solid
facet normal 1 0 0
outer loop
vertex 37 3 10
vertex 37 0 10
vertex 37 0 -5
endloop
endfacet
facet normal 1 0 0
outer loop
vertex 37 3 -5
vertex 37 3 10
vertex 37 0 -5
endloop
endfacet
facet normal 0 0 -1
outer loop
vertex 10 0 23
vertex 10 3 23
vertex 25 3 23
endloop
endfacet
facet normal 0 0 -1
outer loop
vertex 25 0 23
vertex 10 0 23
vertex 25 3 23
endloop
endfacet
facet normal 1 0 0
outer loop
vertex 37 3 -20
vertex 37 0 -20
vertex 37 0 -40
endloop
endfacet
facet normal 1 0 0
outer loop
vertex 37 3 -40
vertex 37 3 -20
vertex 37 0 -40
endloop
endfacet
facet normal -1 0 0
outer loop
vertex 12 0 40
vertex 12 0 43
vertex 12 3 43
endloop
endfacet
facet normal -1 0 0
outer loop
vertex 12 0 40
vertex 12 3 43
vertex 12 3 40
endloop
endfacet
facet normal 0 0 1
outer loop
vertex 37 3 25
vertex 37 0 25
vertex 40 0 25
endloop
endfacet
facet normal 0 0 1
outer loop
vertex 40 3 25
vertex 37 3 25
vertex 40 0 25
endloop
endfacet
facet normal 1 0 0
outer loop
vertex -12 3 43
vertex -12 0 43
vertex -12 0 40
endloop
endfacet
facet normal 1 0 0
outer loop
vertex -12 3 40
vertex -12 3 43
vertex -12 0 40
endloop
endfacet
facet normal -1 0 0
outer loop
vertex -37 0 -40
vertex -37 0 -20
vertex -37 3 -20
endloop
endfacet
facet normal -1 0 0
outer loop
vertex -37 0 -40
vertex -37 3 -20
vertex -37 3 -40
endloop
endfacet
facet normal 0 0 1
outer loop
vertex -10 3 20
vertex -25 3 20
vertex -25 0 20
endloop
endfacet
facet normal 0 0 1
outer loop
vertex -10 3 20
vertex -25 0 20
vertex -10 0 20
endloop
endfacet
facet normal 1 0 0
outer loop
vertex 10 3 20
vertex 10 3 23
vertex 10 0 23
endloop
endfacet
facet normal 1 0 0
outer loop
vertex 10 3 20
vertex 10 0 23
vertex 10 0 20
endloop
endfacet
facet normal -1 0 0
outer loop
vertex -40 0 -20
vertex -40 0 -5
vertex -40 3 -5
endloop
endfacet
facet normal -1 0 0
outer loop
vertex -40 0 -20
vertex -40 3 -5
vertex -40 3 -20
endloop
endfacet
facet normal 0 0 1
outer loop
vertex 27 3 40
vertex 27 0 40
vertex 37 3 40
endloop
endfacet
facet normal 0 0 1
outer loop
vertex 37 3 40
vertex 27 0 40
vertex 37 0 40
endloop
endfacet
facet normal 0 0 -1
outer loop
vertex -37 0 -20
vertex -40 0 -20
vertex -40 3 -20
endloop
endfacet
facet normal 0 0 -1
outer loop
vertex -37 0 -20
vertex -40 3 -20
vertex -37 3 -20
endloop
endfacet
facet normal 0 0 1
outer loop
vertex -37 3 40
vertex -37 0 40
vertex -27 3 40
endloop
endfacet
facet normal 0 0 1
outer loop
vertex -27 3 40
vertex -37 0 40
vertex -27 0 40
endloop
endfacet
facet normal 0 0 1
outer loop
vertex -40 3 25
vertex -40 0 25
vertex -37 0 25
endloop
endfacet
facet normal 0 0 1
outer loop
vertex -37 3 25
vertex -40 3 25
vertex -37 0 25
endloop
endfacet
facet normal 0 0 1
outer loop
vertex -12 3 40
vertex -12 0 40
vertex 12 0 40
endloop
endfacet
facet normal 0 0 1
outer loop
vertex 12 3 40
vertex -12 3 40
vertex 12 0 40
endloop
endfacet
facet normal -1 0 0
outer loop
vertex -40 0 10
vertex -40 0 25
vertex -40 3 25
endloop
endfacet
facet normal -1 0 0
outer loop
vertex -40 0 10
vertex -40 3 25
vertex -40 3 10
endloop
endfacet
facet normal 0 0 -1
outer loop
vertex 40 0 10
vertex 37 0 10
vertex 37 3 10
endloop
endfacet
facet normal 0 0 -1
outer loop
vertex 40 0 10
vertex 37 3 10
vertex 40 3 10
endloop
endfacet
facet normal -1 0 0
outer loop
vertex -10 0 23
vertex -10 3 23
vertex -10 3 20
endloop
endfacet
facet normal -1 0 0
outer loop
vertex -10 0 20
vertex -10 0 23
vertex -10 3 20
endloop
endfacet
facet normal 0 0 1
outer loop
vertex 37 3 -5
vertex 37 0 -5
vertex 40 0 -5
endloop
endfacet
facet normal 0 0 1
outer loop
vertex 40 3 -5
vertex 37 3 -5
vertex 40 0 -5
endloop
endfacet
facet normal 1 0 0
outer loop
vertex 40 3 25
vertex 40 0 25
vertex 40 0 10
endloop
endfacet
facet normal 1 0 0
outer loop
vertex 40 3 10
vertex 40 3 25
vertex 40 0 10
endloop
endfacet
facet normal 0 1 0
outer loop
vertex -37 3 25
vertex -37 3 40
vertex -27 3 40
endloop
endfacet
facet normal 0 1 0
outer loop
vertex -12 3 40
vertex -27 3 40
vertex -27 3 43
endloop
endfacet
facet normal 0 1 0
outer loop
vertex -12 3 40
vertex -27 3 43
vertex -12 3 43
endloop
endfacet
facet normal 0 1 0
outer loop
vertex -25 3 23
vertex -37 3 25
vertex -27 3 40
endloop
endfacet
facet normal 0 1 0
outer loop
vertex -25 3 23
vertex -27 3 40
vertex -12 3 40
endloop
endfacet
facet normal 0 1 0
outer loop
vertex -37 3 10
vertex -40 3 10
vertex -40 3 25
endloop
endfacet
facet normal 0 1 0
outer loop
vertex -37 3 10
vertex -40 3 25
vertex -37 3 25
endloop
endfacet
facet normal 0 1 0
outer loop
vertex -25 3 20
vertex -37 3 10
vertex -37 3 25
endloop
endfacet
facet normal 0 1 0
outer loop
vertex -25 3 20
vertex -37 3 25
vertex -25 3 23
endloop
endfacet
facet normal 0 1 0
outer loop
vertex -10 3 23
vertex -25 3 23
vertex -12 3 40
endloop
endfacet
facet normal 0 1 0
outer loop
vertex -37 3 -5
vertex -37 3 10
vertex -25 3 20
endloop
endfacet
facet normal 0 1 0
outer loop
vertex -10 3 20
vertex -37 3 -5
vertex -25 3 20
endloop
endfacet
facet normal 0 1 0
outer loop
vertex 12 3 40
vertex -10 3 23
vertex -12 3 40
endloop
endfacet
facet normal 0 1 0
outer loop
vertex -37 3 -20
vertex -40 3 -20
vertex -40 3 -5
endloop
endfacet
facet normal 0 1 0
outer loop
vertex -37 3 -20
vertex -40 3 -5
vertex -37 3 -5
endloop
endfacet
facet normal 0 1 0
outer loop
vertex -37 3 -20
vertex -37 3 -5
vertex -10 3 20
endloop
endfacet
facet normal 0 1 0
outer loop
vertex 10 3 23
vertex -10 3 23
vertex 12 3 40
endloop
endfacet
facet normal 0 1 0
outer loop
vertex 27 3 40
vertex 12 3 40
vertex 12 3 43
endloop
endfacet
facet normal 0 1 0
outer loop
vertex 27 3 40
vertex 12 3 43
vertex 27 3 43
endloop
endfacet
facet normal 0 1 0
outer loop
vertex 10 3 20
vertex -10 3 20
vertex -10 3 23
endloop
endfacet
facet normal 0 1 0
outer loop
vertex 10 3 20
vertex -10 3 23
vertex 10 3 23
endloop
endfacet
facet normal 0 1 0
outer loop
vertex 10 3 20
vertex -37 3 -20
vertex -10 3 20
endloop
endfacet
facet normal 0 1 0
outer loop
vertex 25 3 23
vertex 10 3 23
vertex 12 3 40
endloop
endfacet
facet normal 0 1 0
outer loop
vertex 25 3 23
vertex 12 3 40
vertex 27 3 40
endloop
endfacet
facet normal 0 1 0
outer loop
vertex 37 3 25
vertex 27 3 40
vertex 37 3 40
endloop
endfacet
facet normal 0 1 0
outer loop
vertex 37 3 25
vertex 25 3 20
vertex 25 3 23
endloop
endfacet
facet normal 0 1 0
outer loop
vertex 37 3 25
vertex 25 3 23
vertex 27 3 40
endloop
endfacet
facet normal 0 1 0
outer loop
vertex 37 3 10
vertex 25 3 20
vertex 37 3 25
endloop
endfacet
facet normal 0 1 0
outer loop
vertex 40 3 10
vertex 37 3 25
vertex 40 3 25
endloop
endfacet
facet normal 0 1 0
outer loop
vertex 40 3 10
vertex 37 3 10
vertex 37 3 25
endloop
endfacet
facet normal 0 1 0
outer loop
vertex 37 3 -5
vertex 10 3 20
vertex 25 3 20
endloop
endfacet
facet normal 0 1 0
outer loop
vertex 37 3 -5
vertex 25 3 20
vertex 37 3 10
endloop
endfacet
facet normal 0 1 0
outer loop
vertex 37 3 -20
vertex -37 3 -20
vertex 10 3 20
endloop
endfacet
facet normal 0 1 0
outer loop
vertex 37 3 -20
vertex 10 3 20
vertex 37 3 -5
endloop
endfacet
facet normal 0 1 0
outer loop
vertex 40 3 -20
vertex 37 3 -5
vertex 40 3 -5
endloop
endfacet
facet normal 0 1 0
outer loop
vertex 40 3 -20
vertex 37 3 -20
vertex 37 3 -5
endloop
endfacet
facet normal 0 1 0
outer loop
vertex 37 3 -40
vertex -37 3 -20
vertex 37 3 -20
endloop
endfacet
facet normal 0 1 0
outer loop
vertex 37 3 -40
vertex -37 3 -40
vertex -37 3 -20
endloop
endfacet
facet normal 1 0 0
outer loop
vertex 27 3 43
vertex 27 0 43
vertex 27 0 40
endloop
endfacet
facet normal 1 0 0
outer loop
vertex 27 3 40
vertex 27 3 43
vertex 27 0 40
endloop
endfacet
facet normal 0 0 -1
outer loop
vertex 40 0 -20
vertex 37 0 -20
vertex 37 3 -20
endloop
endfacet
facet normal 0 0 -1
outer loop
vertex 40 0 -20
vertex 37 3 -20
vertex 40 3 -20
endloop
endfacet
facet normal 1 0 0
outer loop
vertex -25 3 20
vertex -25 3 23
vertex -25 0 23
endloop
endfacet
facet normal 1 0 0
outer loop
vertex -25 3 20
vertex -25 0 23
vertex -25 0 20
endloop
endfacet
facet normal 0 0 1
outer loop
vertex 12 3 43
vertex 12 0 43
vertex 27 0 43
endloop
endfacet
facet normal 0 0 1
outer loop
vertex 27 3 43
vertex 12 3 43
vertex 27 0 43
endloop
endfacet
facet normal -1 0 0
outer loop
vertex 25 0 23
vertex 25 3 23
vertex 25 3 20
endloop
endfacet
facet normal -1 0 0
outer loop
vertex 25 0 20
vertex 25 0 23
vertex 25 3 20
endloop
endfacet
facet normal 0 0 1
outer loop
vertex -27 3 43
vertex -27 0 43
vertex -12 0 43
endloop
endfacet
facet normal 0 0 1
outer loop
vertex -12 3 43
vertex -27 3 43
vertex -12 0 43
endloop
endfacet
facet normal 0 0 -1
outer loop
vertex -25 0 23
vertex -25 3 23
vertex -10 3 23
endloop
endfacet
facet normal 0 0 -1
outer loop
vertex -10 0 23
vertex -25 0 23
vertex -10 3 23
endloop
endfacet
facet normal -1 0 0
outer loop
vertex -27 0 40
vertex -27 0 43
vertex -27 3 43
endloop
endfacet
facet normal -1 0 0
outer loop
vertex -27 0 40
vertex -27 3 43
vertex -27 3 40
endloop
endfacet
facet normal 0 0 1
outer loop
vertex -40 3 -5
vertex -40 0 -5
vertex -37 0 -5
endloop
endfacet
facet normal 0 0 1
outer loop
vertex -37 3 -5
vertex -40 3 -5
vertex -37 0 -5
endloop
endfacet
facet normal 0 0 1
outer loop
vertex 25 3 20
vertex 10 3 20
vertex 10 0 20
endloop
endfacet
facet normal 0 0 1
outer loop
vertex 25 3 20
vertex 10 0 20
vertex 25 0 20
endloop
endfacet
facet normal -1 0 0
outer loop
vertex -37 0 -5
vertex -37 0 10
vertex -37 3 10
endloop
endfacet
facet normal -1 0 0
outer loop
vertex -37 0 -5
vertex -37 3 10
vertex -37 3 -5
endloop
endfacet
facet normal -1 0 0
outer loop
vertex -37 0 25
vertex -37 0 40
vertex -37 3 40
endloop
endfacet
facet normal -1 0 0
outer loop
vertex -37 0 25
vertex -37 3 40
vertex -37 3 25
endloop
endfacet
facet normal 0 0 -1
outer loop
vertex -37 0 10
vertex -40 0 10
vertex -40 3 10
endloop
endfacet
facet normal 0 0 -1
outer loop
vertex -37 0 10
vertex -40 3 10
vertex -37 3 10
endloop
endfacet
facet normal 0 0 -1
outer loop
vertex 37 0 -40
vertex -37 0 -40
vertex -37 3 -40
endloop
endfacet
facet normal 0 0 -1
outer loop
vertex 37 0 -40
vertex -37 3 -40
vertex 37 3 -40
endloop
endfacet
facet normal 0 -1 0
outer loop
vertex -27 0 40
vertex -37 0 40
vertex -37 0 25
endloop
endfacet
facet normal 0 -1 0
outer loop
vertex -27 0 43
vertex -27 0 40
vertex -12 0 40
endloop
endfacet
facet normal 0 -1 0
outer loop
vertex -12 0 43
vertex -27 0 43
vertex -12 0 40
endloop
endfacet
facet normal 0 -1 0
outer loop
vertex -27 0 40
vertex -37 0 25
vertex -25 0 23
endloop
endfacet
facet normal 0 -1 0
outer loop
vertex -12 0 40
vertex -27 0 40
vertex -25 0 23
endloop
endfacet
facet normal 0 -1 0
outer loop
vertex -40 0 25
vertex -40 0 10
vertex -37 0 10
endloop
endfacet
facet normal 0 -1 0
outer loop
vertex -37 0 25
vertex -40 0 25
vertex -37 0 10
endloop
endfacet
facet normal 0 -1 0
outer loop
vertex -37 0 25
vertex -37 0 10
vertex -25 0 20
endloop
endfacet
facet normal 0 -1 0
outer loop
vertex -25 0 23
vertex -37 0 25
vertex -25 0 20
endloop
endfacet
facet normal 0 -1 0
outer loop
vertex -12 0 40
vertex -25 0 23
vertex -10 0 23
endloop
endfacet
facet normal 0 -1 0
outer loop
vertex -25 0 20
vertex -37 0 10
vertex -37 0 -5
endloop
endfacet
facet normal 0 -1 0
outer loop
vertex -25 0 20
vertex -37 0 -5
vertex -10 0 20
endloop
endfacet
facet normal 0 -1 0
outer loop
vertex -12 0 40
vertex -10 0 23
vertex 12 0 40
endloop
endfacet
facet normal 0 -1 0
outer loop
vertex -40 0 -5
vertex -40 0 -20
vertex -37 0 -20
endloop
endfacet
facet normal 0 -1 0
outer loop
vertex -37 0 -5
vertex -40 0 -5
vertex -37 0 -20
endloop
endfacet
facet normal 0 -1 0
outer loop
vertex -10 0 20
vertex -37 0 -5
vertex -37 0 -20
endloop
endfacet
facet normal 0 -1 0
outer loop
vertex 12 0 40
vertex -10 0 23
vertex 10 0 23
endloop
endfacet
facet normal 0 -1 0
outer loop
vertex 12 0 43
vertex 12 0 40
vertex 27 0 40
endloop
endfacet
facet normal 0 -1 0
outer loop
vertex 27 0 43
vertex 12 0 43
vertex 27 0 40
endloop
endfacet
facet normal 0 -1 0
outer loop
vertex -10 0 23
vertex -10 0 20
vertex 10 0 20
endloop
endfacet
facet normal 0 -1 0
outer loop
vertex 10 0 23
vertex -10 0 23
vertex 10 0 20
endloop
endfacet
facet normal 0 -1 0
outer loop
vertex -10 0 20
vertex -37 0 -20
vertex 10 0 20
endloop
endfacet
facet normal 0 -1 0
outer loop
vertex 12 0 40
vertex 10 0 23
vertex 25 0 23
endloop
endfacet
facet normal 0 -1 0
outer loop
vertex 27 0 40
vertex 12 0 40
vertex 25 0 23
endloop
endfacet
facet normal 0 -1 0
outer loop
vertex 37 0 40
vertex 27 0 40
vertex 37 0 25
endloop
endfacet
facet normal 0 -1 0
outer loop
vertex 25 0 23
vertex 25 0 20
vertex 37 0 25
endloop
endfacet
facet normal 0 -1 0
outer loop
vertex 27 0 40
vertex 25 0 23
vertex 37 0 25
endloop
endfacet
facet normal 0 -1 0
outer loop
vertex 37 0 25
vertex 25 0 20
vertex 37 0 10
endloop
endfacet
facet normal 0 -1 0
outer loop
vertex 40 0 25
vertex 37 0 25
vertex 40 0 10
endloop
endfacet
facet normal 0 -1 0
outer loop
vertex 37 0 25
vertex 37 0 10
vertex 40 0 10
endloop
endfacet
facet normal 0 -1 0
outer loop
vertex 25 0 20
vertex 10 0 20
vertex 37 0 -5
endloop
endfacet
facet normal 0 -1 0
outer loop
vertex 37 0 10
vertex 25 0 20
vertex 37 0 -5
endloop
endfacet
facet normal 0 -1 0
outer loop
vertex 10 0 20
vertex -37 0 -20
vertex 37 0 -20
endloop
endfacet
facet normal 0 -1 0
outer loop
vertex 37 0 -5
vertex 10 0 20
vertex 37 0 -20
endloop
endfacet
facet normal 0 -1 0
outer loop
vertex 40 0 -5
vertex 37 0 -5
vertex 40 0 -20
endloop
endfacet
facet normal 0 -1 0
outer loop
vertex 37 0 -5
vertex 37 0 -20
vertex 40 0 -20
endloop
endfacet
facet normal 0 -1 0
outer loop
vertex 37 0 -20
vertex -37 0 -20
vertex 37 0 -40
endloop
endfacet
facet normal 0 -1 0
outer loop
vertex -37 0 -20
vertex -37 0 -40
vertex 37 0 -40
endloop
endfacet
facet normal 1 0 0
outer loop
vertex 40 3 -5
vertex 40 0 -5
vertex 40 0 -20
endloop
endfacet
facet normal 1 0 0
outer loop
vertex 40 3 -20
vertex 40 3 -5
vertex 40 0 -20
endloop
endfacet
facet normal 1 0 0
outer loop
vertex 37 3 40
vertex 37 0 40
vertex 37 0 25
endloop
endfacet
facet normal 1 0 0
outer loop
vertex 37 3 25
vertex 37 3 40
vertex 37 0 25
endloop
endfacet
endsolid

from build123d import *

# Parameters (mm, degrees)
SKETCH_1_W          = 74
SKETCH_1_H          = 80
SKETCH_1_W_2        = 3
SKETCH_1_H_2        = 15
SKETCH_1_W_3        = 15
SKETCH_1_H_3        = 3
EXTRUDE_1_DEPTH     = 3
SKETCH_2_W          = 15
SKETCH_2_H          = 3
CUT_EXTRUDE_1_DEPTH = 3


with BuildPart() as part:
    # 草图1 → 凸台-拉伸1 (new body)
    with BuildSketch(Plane(origin=(0, 0, 0), x_dir=(1, 0, 0), z_dir=(0, 1, 0))):
        Rectangle(SKETCH_1_W, SKETCH_1_H)
        with Locations((-38.5, -17.5)):
            Rectangle(SKETCH_1_W_2, SKETCH_1_H_2)
        with Locations((-19.5, -41.5)):
            Rectangle(SKETCH_1_W_3, SKETCH_1_H_3)
        with Locations((19.5, -41.5)):
            Rectangle(SKETCH_1_W_3, SKETCH_1_H_3)
        with Locations((38.5, -17.5)):
            Rectangle(SKETCH_1_W_2, SKETCH_1_H_2)
        with Locations((38.5, 12.5)):
            Rectangle(SKETCH_1_W_2, SKETCH_1_H_2)
        with Locations((-38.5, 12.5)):
            Rectangle(SKETCH_1_W_2, SKETCH_1_H_2)
    extrude(amount=EXTRUDE_1_DEPTH)

    # 草图2 → 切除-拉伸1 (cut)
    with BuildSketch(Plane(origin=(0, 3, 0), x_dir=(1, 0, 0), z_dir=(0, 1, 0))):
        with Locations((-17.5, -21.5)):
            Rectangle(SKETCH_2_W, SKETCH_2_H)
        with Locations((17.5, -21.5)):
            Rectangle(SKETCH_2_W, SKETCH_2_H)
    extrude(amount=-CUT_EXTRUDE_1_DEPTH, mode=Mode.SUBTRACT)


solid = part.part
